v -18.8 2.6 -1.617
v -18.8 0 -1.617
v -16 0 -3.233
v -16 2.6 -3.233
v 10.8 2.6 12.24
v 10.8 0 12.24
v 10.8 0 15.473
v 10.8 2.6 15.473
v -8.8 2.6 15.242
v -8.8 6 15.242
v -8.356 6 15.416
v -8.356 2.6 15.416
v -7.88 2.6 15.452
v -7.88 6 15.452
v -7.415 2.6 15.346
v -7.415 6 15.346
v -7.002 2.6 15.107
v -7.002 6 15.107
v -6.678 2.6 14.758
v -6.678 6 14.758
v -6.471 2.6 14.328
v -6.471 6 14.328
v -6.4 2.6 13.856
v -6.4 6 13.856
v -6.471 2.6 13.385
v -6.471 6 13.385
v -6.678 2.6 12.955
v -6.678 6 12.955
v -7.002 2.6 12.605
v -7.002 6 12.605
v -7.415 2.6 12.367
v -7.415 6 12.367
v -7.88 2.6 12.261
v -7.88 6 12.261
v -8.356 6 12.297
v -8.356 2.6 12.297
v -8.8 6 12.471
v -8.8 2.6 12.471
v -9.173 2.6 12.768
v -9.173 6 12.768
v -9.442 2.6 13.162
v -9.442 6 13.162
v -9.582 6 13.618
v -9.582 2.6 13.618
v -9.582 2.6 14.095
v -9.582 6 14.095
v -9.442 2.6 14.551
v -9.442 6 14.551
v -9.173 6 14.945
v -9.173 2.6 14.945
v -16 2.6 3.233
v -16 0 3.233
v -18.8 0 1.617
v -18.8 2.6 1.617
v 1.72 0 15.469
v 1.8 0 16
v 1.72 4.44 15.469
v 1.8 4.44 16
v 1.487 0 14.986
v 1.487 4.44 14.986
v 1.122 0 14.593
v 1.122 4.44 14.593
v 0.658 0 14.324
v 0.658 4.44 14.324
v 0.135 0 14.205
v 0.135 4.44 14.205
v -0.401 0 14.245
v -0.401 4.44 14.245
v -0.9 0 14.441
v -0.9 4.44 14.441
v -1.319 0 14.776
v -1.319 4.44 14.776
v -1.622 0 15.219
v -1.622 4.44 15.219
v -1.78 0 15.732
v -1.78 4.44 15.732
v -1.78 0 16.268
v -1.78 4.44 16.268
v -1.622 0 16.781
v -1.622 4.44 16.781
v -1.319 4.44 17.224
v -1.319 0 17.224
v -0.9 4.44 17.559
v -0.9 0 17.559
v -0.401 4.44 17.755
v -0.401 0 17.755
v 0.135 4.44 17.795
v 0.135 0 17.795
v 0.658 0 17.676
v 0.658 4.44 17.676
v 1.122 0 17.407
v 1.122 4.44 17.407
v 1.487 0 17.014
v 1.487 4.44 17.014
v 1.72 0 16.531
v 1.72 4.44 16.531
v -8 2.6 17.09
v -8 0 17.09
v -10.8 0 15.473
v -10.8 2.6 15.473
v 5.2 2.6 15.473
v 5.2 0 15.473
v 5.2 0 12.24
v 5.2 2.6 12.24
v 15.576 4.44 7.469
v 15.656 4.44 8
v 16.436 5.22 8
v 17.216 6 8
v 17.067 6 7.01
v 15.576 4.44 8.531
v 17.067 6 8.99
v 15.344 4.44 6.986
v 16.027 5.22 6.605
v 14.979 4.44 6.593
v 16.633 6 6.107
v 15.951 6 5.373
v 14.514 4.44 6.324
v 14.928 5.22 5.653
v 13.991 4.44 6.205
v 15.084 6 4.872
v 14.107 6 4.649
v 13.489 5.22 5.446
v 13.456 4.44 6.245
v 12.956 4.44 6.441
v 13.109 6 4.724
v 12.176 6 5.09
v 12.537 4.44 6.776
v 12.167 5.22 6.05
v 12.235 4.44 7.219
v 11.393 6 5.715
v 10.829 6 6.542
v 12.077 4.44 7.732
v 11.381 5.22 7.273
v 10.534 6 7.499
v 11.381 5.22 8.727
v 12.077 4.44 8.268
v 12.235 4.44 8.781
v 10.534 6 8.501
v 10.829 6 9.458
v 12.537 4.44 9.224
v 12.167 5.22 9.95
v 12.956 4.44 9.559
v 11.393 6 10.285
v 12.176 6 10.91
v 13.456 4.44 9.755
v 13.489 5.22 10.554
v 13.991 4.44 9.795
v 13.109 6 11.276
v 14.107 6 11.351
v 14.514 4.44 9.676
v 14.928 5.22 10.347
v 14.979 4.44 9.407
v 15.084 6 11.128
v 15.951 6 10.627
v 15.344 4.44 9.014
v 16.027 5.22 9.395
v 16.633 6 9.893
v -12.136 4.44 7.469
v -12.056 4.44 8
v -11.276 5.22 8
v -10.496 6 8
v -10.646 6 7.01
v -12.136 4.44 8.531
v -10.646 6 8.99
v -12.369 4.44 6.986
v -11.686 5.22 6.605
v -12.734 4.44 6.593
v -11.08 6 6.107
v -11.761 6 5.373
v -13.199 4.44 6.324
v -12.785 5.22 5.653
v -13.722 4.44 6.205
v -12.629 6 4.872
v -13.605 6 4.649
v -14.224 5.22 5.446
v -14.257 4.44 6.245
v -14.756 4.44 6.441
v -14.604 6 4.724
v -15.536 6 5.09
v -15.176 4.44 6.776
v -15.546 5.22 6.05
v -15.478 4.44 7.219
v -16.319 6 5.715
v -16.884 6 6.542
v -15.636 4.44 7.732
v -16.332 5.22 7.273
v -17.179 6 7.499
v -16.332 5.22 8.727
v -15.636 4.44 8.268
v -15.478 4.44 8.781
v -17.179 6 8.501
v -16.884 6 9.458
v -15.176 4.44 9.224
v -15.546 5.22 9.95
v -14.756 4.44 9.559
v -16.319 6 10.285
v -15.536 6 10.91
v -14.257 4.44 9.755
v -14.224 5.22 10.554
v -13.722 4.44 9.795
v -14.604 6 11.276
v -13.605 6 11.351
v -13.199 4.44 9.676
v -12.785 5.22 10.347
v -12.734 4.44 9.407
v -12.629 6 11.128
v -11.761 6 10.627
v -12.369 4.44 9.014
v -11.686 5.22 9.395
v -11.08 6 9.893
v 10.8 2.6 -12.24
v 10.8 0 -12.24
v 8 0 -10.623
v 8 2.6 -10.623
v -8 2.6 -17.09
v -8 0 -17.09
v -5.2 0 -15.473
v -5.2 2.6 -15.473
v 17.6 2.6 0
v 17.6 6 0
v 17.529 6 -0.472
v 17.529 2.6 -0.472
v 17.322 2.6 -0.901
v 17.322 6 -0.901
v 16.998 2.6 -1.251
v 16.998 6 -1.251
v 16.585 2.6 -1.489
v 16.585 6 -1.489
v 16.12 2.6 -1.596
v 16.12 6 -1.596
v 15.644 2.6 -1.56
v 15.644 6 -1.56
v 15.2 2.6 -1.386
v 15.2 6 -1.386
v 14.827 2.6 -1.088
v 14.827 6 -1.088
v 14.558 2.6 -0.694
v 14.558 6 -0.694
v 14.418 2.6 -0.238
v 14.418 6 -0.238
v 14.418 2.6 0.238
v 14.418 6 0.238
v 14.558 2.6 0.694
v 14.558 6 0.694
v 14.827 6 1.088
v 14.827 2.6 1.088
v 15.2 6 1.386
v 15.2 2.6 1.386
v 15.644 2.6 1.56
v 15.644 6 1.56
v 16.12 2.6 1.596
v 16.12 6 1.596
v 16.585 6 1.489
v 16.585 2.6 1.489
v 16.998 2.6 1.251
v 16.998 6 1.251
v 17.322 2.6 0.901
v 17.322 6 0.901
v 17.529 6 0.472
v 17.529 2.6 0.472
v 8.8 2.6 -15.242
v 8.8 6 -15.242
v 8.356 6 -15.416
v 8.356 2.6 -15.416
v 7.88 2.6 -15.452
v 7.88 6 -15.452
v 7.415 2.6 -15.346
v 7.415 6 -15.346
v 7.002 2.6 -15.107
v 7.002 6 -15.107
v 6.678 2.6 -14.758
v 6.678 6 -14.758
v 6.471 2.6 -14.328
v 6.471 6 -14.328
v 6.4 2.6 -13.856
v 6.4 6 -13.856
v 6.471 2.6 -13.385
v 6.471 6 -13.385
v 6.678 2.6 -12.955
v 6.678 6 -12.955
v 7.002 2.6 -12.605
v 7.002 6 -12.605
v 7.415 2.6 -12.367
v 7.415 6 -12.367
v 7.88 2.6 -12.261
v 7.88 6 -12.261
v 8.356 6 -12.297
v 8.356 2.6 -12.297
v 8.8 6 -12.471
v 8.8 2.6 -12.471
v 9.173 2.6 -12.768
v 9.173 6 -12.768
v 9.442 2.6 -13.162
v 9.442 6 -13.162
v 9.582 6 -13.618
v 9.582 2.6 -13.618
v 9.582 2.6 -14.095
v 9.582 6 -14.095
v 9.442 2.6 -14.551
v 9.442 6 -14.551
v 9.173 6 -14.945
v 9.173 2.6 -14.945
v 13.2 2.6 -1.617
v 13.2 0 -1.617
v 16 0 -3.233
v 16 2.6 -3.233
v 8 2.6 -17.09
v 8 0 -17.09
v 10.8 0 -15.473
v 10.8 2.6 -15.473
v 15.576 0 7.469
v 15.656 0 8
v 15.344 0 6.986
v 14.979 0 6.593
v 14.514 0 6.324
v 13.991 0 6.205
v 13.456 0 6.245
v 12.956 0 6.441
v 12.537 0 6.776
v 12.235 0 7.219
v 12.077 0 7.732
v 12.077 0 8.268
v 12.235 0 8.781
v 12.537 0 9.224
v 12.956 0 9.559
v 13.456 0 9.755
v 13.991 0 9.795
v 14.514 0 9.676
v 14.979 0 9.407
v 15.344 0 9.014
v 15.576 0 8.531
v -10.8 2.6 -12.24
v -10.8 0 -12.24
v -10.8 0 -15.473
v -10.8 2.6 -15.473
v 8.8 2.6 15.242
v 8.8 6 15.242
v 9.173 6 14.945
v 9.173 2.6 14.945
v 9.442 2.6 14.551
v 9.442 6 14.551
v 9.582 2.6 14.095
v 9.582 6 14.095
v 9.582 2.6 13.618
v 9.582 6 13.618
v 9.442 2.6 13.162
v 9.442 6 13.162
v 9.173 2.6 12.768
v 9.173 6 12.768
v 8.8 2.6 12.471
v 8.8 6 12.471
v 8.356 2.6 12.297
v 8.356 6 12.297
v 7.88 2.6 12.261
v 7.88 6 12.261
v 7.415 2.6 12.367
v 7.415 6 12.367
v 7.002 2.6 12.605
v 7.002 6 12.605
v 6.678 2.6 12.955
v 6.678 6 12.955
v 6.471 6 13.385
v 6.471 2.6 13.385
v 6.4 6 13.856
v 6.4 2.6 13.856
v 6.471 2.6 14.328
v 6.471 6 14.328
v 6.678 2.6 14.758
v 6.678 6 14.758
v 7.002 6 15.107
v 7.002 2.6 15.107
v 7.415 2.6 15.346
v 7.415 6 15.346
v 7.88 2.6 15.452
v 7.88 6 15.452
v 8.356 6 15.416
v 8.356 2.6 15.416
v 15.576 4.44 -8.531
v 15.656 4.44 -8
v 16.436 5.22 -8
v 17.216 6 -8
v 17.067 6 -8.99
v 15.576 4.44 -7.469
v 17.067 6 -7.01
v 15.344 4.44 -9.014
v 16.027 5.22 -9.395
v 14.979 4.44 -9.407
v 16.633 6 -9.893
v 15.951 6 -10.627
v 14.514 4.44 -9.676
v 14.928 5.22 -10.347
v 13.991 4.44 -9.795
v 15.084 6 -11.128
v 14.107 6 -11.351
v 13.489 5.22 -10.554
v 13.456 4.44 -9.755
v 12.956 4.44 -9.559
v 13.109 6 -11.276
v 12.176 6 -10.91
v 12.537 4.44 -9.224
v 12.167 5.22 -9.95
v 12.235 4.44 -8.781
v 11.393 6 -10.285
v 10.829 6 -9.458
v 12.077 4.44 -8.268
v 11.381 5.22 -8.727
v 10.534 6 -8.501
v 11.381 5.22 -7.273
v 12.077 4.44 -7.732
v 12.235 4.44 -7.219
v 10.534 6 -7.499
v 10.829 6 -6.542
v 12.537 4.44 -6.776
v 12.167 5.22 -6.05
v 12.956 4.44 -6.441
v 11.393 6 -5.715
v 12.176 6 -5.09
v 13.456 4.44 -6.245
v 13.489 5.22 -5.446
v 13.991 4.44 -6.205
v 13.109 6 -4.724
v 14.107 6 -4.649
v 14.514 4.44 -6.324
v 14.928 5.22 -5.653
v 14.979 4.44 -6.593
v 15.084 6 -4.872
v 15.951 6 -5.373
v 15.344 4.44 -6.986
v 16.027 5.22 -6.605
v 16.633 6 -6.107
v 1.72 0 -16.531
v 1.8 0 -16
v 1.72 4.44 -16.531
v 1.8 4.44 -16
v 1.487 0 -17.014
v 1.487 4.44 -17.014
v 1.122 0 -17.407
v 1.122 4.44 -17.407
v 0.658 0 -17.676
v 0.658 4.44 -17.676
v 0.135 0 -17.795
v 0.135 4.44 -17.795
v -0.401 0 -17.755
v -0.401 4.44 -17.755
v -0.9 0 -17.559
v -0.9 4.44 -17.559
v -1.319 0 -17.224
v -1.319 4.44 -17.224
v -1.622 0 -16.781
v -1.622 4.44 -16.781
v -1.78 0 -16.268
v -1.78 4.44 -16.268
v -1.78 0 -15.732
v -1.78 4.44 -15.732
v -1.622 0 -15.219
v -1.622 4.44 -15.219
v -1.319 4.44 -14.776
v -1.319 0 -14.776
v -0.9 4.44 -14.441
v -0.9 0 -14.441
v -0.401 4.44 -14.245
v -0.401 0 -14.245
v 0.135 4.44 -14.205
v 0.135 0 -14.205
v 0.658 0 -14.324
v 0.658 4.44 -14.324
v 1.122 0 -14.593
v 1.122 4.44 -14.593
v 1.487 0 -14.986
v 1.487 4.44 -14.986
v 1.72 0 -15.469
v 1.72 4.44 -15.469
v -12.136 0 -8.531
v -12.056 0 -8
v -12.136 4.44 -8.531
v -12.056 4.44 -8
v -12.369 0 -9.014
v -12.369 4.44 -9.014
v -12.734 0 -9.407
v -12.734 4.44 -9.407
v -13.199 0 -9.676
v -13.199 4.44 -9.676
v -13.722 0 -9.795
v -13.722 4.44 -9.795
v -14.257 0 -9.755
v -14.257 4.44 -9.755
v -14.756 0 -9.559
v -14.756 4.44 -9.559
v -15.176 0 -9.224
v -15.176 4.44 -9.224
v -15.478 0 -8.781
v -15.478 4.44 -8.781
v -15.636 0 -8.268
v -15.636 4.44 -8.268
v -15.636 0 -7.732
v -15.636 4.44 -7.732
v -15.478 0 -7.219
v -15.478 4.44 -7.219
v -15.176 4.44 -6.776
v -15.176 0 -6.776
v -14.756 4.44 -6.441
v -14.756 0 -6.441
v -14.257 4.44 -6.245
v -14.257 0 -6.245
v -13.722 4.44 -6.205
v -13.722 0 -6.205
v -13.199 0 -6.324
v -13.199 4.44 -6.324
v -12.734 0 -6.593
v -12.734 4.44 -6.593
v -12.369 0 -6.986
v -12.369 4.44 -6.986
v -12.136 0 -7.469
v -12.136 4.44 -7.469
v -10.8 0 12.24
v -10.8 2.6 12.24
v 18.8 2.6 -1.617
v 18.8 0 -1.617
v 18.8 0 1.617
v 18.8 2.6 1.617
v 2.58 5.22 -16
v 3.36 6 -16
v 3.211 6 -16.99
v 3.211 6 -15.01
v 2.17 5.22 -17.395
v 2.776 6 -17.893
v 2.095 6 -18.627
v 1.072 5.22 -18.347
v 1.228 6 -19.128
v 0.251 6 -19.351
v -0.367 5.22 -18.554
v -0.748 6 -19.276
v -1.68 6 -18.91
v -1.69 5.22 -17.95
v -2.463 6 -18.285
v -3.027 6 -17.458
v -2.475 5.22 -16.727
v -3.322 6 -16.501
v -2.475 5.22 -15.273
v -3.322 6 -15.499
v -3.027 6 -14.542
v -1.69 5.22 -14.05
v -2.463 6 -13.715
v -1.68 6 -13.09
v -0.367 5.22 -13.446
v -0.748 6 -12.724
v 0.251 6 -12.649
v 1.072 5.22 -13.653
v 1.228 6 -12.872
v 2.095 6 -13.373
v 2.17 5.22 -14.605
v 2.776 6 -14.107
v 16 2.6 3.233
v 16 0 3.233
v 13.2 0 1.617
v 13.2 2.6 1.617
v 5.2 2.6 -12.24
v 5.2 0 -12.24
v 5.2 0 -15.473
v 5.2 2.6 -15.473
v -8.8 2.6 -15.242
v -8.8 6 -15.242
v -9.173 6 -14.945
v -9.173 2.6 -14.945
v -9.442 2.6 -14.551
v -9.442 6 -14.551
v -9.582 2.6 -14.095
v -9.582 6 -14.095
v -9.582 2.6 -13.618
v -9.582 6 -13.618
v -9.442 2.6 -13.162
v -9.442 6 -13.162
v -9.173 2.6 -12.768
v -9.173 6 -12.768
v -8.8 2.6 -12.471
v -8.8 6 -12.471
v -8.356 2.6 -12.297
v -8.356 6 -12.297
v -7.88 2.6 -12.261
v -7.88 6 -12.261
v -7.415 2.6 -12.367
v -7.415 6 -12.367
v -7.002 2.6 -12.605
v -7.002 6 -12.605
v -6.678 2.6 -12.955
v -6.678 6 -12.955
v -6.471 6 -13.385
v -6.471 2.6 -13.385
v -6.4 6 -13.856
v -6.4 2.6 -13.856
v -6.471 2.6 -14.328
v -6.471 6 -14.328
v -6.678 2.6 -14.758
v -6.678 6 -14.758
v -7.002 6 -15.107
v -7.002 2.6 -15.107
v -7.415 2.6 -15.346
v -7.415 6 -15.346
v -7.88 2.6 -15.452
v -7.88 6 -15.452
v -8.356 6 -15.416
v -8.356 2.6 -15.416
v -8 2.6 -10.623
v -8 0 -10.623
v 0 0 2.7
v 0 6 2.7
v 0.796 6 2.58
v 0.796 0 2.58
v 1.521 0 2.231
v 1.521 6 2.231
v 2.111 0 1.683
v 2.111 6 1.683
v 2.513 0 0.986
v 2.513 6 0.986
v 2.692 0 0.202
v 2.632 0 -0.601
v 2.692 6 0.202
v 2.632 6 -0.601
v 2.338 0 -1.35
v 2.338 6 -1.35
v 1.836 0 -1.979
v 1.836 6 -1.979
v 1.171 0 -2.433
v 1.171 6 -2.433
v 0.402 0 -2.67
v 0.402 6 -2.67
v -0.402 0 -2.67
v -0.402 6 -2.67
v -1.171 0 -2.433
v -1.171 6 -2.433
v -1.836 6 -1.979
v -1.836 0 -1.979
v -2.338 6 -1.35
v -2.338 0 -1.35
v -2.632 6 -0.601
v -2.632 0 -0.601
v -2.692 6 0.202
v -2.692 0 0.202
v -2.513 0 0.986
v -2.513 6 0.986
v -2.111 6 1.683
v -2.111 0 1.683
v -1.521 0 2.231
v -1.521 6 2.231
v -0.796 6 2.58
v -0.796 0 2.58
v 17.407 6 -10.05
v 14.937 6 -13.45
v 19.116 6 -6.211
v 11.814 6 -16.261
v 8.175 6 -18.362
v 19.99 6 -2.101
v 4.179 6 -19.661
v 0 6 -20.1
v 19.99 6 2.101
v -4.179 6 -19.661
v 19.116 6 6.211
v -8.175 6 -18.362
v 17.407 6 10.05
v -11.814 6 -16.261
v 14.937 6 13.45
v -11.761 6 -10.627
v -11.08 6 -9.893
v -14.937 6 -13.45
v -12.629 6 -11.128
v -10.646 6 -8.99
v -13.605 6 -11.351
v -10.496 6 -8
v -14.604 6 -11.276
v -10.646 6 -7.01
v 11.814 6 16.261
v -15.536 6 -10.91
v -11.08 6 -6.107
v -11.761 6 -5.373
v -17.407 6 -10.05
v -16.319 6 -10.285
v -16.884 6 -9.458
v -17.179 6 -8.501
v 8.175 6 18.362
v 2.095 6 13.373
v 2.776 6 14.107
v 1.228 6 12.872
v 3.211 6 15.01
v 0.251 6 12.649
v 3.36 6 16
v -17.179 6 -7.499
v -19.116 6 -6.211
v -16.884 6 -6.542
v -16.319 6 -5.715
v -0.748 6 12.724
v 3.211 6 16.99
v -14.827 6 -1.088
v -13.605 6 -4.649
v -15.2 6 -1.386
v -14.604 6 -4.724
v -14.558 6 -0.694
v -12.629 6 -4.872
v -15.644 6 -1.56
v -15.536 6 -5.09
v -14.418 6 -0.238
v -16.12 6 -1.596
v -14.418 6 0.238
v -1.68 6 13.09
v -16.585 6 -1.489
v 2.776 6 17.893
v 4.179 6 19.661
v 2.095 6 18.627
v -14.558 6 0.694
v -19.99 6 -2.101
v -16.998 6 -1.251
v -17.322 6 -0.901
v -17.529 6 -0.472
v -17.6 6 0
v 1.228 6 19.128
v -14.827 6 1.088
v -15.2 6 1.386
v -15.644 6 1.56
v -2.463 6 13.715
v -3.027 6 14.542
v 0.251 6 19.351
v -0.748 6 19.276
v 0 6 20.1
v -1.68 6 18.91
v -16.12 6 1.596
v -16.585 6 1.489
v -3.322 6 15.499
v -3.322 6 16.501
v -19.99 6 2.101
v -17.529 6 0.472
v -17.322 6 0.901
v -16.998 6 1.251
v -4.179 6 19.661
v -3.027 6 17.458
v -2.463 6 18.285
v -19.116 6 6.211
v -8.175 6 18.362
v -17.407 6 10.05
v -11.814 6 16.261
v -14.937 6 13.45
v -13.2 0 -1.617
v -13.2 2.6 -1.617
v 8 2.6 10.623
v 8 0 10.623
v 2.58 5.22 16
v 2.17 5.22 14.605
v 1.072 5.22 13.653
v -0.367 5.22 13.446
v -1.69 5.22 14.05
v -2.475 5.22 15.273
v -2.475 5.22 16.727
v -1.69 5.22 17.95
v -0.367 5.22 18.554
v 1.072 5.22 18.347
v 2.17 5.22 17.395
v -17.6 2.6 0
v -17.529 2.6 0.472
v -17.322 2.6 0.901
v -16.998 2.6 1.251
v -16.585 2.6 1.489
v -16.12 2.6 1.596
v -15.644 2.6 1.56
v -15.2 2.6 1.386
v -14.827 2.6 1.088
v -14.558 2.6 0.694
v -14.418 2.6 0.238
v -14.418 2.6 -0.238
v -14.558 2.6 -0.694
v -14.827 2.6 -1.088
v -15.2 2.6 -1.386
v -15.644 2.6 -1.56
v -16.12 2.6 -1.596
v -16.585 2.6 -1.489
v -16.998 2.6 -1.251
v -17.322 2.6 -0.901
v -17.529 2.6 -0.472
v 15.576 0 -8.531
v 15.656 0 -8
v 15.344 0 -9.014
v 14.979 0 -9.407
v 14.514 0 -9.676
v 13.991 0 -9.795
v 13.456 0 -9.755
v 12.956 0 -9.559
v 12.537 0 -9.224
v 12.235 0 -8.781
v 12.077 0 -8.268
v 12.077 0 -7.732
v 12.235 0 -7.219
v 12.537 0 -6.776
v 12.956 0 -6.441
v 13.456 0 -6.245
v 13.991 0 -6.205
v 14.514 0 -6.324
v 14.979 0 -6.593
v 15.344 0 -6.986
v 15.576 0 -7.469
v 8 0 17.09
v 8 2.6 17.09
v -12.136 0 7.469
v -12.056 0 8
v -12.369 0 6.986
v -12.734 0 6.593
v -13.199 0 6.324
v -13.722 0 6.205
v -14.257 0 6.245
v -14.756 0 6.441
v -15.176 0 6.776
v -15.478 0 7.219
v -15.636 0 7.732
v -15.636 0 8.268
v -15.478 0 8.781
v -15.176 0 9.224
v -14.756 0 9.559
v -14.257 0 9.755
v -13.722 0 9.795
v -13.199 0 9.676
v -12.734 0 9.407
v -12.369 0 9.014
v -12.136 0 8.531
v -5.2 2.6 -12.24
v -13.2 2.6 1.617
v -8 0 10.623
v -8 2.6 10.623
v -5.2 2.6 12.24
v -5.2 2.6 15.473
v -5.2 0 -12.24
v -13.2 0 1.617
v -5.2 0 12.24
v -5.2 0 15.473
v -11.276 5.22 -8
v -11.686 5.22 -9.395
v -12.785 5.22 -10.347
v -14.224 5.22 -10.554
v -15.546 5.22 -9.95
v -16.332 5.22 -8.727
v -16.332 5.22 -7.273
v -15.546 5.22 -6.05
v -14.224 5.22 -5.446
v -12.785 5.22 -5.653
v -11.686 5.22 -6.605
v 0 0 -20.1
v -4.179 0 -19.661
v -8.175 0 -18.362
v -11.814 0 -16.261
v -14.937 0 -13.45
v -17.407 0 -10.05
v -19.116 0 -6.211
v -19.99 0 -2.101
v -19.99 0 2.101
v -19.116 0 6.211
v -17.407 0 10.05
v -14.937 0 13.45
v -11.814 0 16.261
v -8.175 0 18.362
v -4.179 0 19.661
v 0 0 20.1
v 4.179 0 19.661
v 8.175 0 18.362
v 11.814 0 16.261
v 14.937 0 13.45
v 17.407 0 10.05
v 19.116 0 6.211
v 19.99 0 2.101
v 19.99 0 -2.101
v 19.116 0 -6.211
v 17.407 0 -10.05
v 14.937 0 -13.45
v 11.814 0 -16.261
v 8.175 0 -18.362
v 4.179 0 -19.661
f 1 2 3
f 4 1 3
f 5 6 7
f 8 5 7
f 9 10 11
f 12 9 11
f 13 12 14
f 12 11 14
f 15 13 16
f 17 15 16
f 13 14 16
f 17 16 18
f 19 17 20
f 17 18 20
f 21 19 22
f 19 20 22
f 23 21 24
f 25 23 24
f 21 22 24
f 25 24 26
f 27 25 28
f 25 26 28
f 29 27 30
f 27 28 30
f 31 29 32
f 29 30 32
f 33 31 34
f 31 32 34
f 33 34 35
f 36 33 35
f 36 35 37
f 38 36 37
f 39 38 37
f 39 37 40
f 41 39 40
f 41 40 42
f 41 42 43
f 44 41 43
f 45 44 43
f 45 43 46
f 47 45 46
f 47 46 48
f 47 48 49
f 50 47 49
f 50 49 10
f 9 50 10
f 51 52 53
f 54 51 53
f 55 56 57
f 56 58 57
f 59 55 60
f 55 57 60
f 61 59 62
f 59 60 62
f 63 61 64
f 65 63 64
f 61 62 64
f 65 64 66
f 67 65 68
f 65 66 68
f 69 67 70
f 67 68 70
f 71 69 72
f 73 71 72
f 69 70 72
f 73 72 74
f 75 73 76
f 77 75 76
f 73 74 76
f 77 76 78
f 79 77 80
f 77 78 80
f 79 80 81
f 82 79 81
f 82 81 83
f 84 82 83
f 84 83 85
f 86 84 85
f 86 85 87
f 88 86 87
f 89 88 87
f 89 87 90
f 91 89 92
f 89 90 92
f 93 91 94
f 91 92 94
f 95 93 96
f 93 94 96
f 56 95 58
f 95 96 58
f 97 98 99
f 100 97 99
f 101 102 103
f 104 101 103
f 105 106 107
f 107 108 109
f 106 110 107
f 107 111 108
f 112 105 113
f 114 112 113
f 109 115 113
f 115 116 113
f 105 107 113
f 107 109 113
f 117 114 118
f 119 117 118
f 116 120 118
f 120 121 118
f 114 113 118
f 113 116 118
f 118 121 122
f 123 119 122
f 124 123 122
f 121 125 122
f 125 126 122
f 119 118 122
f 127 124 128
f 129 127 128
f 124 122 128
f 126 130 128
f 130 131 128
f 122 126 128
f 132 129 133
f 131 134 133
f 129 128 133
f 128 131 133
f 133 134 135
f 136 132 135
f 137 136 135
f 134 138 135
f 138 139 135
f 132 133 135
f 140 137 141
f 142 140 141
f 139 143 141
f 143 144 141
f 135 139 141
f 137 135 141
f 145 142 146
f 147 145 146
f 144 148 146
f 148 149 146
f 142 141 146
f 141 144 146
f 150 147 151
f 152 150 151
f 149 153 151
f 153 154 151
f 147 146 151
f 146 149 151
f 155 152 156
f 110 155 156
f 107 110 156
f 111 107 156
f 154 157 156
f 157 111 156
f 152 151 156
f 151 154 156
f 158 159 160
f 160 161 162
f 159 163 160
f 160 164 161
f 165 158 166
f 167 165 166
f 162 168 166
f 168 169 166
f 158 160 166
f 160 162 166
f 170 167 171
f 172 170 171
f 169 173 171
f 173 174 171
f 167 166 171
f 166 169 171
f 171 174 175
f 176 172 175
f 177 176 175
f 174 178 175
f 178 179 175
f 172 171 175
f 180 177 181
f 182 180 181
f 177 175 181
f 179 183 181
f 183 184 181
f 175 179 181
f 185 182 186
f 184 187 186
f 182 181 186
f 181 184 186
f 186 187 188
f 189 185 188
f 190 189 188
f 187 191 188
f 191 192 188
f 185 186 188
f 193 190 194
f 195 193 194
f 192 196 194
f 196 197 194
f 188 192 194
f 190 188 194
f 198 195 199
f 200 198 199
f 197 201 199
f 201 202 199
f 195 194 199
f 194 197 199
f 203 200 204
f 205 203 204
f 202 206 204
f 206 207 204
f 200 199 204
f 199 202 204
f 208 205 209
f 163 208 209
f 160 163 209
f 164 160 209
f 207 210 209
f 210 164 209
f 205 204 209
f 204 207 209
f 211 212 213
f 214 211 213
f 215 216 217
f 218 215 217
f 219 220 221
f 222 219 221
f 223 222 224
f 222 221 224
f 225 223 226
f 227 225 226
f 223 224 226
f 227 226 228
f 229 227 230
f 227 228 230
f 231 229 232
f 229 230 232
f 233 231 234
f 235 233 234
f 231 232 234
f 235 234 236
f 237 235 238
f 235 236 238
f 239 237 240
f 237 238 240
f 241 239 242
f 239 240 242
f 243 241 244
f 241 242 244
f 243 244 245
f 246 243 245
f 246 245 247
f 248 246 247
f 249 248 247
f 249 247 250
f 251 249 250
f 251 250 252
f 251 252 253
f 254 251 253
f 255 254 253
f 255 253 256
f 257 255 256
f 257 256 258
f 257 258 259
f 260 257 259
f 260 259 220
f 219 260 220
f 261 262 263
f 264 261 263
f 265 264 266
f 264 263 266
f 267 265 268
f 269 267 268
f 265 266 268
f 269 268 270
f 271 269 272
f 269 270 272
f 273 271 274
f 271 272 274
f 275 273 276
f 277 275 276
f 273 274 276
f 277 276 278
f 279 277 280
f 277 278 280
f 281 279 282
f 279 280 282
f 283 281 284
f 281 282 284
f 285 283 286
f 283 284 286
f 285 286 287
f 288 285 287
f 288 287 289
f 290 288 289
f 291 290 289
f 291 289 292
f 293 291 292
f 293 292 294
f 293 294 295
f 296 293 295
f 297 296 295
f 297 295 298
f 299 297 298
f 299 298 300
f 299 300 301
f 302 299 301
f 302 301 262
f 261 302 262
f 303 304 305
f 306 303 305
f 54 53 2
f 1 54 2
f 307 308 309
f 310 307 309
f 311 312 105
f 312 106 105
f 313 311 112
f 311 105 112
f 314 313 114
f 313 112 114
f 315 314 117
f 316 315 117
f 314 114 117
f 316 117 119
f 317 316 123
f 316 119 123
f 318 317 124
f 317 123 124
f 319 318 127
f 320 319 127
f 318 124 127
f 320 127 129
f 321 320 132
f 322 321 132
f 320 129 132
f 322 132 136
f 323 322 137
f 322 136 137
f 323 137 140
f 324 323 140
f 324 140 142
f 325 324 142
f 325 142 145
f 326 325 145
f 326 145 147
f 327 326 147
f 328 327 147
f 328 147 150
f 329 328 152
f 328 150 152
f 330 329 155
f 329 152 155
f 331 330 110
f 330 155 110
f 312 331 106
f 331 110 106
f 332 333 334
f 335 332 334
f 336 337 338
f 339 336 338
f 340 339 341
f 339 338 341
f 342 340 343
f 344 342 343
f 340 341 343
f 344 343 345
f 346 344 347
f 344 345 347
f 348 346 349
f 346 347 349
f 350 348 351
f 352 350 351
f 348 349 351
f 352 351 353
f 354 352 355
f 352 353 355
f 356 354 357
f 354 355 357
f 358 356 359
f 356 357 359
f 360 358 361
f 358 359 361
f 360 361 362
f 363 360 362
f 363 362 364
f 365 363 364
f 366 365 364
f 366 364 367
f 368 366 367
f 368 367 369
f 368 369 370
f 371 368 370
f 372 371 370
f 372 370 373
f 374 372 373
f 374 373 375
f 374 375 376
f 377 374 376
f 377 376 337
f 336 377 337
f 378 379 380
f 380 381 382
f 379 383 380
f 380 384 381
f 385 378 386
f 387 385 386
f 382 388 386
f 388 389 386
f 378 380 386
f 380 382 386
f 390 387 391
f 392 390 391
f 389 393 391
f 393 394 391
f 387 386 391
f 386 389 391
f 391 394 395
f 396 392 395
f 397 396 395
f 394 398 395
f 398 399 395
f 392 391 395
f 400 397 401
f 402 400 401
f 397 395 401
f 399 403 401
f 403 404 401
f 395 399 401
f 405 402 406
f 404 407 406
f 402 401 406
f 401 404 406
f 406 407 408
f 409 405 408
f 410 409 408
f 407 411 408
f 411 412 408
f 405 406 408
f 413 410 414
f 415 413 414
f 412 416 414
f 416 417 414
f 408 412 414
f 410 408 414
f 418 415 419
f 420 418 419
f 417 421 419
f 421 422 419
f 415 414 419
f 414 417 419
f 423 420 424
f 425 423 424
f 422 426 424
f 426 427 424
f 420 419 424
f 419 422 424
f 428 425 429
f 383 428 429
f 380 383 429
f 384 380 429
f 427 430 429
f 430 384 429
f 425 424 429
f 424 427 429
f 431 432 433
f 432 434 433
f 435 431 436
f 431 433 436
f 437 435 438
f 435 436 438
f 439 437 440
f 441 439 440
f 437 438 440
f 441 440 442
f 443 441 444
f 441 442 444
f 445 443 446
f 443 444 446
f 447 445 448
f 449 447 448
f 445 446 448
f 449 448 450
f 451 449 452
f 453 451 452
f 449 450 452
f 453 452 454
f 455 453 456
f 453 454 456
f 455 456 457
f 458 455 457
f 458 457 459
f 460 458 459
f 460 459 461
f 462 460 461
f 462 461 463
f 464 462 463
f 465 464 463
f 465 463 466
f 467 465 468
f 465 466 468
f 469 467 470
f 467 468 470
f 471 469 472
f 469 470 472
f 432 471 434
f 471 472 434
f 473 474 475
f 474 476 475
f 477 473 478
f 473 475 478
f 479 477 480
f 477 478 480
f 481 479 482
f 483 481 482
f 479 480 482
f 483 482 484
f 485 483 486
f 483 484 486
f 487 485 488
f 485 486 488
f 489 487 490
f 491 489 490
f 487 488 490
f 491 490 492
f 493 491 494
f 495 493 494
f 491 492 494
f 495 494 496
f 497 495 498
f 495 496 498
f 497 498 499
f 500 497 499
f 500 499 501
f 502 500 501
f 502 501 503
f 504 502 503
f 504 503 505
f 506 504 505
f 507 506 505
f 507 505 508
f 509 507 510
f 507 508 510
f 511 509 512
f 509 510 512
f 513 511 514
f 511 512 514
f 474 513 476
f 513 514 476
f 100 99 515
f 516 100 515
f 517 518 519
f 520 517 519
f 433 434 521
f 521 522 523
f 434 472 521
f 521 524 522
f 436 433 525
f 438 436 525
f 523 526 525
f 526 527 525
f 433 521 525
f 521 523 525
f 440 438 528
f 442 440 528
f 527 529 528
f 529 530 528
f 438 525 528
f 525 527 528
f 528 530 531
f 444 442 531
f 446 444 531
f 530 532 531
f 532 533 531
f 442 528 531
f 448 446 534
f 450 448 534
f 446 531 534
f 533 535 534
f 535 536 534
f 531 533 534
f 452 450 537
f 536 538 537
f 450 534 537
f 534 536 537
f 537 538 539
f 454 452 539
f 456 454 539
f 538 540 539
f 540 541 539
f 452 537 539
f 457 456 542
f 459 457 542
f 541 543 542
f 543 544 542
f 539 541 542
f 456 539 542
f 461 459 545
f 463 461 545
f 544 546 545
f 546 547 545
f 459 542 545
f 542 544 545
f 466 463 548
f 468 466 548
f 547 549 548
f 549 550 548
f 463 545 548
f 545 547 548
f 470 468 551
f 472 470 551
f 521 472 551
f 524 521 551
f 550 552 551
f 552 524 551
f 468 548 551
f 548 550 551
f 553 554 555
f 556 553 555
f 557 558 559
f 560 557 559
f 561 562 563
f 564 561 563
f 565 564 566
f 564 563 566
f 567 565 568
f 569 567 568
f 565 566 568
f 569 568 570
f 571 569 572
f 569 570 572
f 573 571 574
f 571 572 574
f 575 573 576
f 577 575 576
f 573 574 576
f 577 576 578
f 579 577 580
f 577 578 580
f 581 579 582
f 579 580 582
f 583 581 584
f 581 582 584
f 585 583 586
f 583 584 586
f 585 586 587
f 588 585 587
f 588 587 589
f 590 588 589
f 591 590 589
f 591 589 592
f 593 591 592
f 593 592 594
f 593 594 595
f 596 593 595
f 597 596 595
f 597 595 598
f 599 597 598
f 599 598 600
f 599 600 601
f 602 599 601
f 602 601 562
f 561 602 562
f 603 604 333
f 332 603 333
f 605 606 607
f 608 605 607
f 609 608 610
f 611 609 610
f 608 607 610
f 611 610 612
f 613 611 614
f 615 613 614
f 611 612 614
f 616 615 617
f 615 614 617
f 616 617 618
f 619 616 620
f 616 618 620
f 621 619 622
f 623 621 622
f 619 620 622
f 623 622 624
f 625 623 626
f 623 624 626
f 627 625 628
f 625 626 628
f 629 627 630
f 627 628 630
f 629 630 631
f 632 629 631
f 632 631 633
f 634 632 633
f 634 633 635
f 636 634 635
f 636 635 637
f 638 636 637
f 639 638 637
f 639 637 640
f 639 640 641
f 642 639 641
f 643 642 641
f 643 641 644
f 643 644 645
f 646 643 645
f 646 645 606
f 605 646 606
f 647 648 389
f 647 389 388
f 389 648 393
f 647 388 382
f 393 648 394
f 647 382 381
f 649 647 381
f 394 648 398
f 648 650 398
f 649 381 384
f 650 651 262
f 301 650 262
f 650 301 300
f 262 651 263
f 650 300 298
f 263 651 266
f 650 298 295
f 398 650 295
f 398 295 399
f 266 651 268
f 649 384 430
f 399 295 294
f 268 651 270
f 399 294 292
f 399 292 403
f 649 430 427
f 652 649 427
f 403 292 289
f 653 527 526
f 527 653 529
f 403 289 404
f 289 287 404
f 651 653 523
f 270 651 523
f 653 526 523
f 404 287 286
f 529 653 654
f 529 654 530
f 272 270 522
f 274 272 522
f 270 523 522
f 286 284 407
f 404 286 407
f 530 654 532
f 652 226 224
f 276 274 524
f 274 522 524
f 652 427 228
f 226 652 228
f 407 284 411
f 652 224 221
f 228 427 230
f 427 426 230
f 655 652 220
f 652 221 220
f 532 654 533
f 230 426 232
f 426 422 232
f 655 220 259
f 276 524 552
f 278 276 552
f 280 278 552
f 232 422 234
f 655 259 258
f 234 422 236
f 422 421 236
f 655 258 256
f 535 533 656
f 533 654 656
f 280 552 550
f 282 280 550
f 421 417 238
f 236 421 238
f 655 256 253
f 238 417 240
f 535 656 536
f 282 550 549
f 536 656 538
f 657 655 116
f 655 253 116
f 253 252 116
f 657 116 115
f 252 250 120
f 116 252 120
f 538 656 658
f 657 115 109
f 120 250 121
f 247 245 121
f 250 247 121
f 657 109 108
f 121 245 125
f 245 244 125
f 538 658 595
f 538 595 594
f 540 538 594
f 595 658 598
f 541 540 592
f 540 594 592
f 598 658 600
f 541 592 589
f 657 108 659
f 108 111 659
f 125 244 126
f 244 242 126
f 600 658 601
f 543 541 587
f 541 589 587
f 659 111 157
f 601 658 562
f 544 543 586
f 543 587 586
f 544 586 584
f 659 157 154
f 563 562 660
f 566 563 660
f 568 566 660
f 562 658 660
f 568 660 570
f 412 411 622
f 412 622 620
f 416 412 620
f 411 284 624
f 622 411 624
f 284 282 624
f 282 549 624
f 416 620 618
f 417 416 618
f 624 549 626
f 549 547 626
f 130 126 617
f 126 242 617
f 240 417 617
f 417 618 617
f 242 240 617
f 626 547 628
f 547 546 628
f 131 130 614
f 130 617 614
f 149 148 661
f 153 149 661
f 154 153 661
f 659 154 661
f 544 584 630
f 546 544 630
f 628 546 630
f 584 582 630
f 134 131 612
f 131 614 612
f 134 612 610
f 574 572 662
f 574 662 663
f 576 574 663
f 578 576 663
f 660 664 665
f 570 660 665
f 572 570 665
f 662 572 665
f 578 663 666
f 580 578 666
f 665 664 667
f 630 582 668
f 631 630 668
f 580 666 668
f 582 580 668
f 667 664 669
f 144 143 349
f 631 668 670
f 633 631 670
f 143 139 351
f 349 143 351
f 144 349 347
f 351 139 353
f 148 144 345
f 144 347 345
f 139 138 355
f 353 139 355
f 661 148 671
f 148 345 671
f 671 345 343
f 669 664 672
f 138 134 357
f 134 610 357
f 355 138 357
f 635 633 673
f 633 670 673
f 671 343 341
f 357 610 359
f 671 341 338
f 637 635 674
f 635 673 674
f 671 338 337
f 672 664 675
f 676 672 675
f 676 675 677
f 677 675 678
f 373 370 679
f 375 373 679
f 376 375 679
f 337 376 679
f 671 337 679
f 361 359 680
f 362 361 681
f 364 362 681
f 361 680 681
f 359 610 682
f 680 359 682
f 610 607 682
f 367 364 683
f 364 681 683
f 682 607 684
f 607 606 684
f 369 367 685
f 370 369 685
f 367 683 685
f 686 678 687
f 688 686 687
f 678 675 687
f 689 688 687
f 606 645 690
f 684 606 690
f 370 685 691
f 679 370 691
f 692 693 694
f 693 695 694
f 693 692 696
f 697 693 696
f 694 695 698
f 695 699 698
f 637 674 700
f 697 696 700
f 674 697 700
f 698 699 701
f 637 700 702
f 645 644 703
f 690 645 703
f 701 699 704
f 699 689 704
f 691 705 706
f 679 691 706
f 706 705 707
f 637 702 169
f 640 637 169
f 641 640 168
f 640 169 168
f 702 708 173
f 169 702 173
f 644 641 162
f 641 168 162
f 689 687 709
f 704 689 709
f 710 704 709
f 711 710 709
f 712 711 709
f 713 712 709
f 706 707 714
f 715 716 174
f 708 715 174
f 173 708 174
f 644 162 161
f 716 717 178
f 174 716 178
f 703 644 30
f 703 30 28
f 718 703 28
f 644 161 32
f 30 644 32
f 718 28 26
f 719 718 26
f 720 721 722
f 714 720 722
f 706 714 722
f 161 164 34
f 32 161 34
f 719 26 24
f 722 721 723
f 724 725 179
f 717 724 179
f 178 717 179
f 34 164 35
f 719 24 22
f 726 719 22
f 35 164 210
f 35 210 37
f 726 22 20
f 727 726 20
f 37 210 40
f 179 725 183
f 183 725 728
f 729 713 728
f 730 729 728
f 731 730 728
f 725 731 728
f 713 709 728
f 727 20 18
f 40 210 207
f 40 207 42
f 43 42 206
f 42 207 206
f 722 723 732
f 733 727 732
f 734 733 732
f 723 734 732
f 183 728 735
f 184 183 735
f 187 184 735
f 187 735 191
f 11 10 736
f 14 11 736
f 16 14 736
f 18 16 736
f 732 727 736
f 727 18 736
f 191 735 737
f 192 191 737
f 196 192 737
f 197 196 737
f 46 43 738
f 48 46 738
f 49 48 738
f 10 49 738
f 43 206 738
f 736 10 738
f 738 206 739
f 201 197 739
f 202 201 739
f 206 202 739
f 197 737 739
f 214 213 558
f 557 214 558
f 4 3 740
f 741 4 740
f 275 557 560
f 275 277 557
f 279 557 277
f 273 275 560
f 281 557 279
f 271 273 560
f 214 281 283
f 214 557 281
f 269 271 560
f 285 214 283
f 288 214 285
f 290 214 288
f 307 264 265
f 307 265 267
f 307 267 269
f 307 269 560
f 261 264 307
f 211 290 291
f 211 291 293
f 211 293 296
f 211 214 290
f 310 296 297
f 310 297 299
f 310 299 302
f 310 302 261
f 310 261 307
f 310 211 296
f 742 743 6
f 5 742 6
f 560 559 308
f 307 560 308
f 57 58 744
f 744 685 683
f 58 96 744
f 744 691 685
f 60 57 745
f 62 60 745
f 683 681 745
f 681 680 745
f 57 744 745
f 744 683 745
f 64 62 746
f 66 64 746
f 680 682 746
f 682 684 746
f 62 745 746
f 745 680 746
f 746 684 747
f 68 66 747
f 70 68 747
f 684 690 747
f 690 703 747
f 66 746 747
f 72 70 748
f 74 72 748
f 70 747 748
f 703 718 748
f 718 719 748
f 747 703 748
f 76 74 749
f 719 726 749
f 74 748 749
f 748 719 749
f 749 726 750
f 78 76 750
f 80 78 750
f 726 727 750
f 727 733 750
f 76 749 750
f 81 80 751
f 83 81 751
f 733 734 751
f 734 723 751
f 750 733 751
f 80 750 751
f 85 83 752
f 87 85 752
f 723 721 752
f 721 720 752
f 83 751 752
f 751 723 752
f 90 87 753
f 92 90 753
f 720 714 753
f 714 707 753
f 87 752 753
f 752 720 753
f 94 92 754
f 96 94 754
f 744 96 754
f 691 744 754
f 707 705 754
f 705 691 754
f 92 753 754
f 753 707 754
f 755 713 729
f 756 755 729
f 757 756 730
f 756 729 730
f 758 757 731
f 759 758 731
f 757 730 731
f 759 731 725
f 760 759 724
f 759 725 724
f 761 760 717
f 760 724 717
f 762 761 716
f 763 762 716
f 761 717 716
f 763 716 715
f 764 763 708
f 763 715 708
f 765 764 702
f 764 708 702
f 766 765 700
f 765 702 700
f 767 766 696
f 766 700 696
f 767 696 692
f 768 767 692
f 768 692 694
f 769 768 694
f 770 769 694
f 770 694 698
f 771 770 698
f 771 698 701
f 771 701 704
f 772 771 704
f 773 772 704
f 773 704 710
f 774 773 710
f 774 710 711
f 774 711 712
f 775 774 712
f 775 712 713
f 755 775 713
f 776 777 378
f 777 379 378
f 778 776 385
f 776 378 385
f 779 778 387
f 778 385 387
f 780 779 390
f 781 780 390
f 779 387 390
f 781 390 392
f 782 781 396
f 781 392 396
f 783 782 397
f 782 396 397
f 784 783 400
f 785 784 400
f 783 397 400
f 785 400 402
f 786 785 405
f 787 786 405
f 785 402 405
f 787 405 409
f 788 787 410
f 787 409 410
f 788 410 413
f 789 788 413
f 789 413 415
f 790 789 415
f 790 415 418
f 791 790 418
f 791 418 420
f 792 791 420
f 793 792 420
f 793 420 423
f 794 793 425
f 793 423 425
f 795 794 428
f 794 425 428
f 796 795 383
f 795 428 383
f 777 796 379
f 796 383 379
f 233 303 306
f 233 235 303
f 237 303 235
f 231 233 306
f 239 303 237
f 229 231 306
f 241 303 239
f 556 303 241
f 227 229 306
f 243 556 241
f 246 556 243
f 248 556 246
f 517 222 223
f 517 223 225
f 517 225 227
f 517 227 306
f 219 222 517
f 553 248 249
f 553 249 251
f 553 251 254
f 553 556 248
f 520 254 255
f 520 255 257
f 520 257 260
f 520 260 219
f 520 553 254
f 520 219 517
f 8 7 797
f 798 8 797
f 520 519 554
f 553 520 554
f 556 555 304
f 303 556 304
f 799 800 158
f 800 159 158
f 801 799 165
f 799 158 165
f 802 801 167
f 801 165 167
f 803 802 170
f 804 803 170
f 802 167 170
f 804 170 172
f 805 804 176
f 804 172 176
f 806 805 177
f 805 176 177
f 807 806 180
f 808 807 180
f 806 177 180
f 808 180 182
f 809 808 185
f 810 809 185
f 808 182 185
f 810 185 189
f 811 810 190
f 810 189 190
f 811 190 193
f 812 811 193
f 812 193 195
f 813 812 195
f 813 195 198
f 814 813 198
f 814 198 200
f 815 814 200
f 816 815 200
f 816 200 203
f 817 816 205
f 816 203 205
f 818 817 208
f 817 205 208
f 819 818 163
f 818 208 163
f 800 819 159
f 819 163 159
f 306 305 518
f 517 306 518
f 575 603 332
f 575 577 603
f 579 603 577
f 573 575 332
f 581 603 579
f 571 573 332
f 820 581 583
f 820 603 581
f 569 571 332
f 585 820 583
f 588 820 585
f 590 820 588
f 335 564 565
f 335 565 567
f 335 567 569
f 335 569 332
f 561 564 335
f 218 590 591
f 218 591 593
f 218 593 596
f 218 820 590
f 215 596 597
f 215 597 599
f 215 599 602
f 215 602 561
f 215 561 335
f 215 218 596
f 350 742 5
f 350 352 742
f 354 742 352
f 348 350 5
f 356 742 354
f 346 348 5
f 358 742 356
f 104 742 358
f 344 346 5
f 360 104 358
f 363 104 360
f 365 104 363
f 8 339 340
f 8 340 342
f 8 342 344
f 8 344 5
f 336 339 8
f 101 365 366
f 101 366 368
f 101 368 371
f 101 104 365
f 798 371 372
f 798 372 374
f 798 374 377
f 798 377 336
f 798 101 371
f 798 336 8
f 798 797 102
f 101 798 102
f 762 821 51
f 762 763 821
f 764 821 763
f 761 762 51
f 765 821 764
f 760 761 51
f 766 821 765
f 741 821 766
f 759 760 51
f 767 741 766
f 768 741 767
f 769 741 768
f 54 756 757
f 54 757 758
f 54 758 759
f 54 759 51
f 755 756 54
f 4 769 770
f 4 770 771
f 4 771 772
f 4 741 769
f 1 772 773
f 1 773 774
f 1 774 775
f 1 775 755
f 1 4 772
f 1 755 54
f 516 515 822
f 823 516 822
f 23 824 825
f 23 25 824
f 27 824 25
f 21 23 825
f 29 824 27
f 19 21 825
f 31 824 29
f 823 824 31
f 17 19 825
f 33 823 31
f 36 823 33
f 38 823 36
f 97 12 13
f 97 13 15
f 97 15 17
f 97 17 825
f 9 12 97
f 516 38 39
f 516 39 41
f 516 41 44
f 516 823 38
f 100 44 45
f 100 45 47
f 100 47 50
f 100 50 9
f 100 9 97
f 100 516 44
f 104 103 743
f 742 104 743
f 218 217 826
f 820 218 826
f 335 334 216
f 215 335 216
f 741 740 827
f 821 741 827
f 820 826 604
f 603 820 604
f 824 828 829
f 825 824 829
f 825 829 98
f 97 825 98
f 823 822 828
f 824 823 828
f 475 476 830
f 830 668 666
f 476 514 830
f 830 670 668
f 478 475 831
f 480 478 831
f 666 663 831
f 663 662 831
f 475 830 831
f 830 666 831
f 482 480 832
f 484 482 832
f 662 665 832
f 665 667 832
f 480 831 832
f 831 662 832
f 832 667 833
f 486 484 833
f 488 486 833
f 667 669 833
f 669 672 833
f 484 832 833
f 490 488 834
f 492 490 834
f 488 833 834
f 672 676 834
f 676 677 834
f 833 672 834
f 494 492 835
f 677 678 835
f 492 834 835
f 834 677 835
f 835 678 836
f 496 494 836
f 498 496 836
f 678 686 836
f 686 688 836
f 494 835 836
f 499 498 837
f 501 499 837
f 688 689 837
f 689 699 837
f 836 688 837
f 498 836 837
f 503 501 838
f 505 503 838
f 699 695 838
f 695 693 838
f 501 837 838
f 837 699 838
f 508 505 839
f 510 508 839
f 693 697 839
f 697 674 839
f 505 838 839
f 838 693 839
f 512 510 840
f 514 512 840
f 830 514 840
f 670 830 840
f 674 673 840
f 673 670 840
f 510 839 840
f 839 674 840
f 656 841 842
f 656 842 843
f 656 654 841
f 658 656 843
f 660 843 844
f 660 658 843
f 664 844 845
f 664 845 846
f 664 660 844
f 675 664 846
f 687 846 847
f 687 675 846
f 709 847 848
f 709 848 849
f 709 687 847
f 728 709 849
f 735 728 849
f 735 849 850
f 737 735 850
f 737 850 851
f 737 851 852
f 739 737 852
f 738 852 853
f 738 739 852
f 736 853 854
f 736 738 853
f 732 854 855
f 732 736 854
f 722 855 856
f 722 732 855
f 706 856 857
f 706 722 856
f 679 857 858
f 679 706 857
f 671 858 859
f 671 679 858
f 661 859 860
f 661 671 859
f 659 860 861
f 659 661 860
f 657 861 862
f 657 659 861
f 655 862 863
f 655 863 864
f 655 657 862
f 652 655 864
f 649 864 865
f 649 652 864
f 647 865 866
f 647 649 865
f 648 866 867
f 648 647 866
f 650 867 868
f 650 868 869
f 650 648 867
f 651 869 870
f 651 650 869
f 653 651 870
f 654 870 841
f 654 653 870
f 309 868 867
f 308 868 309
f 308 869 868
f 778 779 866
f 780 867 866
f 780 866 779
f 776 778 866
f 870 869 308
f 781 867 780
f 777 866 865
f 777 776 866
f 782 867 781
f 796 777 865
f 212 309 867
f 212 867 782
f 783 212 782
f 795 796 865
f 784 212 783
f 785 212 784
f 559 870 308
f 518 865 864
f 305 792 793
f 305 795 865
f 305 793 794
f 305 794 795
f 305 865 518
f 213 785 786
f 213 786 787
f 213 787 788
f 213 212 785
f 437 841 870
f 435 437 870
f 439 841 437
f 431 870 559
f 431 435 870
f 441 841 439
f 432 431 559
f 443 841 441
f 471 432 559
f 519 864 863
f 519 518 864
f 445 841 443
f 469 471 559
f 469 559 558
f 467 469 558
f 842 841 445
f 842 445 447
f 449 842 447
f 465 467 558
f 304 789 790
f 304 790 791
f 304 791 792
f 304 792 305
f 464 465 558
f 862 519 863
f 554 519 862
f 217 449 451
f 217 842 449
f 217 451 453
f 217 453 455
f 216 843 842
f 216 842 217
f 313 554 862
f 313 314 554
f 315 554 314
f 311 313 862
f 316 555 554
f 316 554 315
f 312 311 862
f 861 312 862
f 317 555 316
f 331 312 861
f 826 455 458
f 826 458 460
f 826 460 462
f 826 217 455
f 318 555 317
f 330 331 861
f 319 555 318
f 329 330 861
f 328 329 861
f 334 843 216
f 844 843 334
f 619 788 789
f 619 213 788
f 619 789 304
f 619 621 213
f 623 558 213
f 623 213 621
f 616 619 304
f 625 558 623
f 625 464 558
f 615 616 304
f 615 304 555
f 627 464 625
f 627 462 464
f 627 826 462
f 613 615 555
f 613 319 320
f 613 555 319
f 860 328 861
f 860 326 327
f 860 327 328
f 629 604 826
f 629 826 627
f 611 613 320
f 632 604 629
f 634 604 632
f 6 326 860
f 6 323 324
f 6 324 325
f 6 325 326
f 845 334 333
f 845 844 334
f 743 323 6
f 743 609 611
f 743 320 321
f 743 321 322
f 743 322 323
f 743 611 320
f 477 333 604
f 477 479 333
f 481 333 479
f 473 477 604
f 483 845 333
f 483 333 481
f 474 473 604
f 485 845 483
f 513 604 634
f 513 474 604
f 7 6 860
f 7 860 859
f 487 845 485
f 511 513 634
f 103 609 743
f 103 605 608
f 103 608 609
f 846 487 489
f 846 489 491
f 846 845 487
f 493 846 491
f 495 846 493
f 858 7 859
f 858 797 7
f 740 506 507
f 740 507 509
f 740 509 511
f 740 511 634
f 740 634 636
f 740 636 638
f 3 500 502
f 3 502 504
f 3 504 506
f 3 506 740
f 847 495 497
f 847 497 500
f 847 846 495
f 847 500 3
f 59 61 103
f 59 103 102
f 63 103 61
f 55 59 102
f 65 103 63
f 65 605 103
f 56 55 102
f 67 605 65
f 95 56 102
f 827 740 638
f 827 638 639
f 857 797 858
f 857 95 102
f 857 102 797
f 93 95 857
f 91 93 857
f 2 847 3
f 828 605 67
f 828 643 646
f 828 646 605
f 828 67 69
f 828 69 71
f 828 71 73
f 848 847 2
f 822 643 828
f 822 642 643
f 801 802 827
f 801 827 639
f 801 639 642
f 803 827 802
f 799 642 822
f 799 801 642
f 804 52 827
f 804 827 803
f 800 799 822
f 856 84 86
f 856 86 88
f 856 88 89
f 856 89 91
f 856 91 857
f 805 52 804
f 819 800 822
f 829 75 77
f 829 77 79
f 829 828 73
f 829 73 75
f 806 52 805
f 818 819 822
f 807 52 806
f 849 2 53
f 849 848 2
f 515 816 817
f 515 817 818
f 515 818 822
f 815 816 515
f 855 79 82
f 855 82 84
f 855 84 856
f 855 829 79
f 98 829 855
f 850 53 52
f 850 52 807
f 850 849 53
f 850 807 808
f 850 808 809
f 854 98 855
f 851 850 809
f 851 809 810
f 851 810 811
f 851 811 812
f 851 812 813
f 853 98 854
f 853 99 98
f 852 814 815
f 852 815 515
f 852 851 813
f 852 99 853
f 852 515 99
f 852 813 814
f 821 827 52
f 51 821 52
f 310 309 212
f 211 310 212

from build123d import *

# Parameters (mm, degrees)
SKETCH1_W            = 20.1
SKETCH1_H            = 6
SKETCH6_R            = 2.7
CUT_EXTRUDE2_DEPTH   = 30.052022305
CUT_EXTRUDE3_DEPTH   = 2.6
M3_CLEARANCE_HOLE2_D = 3.2
CIRPATTERN1_COUNT    = 6


# Read off the part's stored shape, not the designer's step: CSK for M3 Hex Socket Countersunk Cap Screw1
with BuildPart() as part:
    # Sketch1 → Revolve1 (revolve)
    with BuildSketch(Plane.XY, mode=Mode.PRIVATE) as revolve1_sk:
        with Locations((10.05, 3)):
            Rectangle(SKETCH1_W, SKETCH1_H)
    revolve(revolve1_sk.sketch.rotate(Axis((0, 0, 0), (0, 1, 0)), 90), axis=Axis((0, 0, 0), (0, 1, 0)))

    # Sketch6 → Cut-Extrude2 (cut, through all)
    with BuildSketch(Plane(origin=(0, 6, 0), x_dir=(1, 0, 0), z_dir=(0, 1, 0))):
        with Locations(Location((0, 0, 0), (0, 0, 270))):
            Circle(SKETCH6_R)
    extrude(amount=-CUT_EXTRUDE2_DEPTH, mode=Mode.SUBTRACT)

    # Sketch9 → Cut-Extrude3 (cut)
    with BuildSketch(Plane.XZ):
        Polygon((16, 3.233161507), (13.2, 1.616580754), (13.2, -1.616580754), (16, -3.233161507), (18.8, -1.616580754), (18.8, 1.616580754), align=None)
    cut_extrude3 = extrude(amount=-CUT_EXTRUDE3_DEPTH, mode=Mode.SUBTRACT)

    # M3 Clearance Hole2 (through all)
    with Locations(Plane(origin=(0, 2.6, 0), x_dir=(-1, 0, 0), z_dir=(0, -1, 0))):
        with Locations((-16, 0)):
            m3_clearance_hole2 = Hole(M3_CLEARANCE_HOLE2_D / 2)

    # CirPattern1: Cut-Extrude3, M3 Clearance Hole2 ×6 about axis
    cirpattern1_axis = Axis((0, 0, 0), (0, 1, 0))
    add([cut_extrude3.rotate(cirpattern1_axis, i * 360 / CIRPATTERN1_COUNT) for i in range(1, CIRPATTERN1_COUNT)], mode=Mode.SUBTRACT)
    add([m3_clearance_hole2.rotate(cirpattern1_axis, i * 360 / CIRPATTERN1_COUNT) for i in range(1, CIRPATTERN1_COUNT)], mode=Mode.SUBTRACT)

    # CSK for M3 Hex Socket Countersunk Ca 2 → CSK for M3 Hex Socket Countersunk Cap Screw1 (revolve, cut)
    with BuildSketch(Plane(origin=(-13.856406461, 0, 8), x_dir=(1, 0, 0), z_dir=(0, 0, 1))):
        Polygon((0, 0), (1.8, 0), (1.8, 4.44), (3.36, 6), (0, 6), align=None)
    revolve(axis=Axis((-13.856406461, 0, 8), (0, 1, 0)), mode=Mode.SUBTRACT)

    # CSK for M3 Hex Socket Countersunk Ca 3 o → CSK for M3 Hex Socket Countersunk Ca 3 (revolve, cut)
    with BuildSketch(Plane(origin=(-13.856406461, 0, -8), x_dir=(1, 0, 0), z_dir=(0, 0, 1))):
        Polygon((0, 0), (1.8, 0), (1.8, 4.44), (3.36, 6), (0, 6), align=None)
    revolve(axis=Axis((-13.856406461, 0, -8), (0, 1, 0)), mode=Mode.SUBTRACT)

    # CSK for M3 Hex Socket Countersunk Ca 4 o → CSK for M3 Hex Socket Countersunk Ca 4 (revolve, cut)
    with BuildSketch(Plane.XY.offset(-16)):
        Polygon((0, 0), (1.8, 0), (1.8, 4.44), (3.36, 6), (0, 6), align=None)
    revolve(axis=Axis((0, 0, -16), (0, 1, 0)), mode=Mode.SUBTRACT)

    # CSK for M3 Hex Socket Countersunk Ca 5 o → CSK for M3 Hex Socket Countersunk Ca 5 (revolve, cut)
    with BuildSketch(Plane(origin=(13.856406461, 0, -8), x_dir=(1, 0, 0), z_dir=(0, 0, 1))):
        Polygon((0, 0), (1.8, 0), (1.8, 4.44), (3.36, 6), (0, 6), align=None)
    revolve(axis=Axis((13.856406461, 0, -8), (0, 1, 0)), mode=Mode.SUBTRACT)

    # CSK for M3 Hex Socket Countersunk Ca 6 o → CSK for M3 Hex Socket Countersunk Ca 6 (revolve, cut)
    with BuildSketch(Plane(origin=(13.856406461, 0, 8), x_dir=(1, 0, 0), z_dir=(0, 0, 1))):
        Polygon((0, 0), (1.8, 0), (1.8, 4.44), (3.36, 6), (0, 6), align=None)
    revolve(axis=Axis((13.856406461, 0, 8), (0, 1, 0)), mode=Mode.SUBTRACT)

    # CSK for M3 Hex Socket Countersunk Ca 7 o → CSK for M3 Hex Socket Countersunk Ca 7 (revolve, cut)
    with BuildSketch(Plane.XY.offset(16)):
        Polygon((0, 0), (1.8, 0), (1.8, 4.44), (3.36, 6), (0, 6), align=None)
    revolve(axis=Axis((0, 0, 16), (0, 1, 0)), mode=Mode.SUBTRACT)


solid = part.part
